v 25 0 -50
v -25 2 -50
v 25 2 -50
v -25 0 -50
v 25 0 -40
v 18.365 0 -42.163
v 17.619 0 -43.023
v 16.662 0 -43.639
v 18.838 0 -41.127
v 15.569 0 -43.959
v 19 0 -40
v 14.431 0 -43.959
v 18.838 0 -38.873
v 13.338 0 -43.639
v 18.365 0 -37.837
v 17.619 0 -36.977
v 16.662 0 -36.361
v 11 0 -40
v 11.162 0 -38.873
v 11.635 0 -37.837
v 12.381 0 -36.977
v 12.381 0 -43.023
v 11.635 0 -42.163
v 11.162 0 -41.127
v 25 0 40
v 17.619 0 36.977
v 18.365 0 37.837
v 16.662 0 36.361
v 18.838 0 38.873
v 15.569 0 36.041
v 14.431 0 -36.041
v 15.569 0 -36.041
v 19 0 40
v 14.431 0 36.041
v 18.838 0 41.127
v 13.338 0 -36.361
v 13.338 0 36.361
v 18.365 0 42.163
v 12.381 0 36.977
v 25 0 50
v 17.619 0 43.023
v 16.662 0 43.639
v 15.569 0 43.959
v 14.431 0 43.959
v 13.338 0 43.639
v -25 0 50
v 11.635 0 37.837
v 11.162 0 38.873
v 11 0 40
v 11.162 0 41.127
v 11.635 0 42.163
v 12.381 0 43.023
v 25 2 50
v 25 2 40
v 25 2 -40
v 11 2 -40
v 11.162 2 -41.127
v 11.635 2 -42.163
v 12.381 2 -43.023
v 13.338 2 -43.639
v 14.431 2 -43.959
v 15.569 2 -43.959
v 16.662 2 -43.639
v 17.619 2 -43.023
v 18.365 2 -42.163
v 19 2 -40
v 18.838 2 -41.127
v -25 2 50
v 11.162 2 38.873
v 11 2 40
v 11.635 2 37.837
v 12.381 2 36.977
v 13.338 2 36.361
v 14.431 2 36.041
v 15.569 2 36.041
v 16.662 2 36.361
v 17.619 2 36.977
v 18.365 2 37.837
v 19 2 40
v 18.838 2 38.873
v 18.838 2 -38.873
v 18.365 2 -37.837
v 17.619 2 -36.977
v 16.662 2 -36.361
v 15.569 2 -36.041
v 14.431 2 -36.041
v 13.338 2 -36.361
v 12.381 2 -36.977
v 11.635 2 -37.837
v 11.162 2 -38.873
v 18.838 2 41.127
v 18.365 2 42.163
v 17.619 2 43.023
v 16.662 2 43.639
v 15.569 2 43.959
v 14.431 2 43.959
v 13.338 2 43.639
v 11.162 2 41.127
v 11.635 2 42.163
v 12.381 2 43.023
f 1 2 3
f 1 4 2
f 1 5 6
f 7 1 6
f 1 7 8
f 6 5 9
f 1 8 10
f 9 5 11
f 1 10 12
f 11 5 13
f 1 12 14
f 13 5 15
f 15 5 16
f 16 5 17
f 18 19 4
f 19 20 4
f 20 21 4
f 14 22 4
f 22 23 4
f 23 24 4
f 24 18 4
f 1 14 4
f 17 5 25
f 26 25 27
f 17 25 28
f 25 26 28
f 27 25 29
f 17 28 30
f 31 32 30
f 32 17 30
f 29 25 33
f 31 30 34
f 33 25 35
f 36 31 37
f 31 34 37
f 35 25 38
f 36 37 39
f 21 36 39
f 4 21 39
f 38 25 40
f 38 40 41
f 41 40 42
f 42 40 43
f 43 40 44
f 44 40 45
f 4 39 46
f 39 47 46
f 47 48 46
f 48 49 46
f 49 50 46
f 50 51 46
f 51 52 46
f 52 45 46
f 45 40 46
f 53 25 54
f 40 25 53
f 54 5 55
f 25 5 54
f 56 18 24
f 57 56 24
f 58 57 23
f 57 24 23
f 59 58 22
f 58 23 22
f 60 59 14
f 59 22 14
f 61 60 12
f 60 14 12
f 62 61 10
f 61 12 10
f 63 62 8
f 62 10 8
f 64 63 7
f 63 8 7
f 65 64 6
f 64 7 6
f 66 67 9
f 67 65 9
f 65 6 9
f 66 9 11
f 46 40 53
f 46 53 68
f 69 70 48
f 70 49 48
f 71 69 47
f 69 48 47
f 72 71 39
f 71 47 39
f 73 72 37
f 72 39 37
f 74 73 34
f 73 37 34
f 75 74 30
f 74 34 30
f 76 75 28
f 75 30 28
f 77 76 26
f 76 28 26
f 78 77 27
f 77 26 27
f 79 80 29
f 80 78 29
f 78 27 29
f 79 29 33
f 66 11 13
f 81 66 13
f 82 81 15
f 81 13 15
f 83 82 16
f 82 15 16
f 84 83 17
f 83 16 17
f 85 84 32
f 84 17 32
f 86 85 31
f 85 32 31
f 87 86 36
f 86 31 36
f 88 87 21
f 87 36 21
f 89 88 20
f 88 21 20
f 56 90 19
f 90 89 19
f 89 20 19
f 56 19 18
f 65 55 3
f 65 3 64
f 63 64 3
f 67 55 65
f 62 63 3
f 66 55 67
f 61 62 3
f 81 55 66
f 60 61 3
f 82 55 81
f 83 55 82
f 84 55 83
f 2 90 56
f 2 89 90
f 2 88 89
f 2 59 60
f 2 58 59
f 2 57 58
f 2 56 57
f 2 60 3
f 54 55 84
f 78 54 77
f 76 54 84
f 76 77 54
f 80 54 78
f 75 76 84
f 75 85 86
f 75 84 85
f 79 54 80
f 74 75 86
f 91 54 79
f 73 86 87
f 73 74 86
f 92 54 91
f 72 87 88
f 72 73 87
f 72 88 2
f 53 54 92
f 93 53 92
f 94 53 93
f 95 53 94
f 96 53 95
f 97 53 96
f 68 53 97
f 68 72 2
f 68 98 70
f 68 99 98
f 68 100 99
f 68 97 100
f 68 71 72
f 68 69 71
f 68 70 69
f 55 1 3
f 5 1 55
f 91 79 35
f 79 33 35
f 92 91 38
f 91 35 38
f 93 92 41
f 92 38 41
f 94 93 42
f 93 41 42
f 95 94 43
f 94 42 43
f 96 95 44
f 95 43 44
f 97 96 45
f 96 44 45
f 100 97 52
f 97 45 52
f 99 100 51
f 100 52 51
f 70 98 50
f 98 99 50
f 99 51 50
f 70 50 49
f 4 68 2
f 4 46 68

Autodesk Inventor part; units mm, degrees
ref_plane "YZ Plane" through (0, 0, 0) normal (1, 0, 0) x (0, 1, 0)
ref_plane "XZ Plane" through (0, 0, 0) normal (0, 1, 0) x (-1, 0, 0)
ref_plane "XY Plane" through (0, 0, 0) normal (0, 0, 1) x (1, 0, 0)
sketch "Sketch1" plane through (0, 0, 0) normal (0, 1, 0) x (-1, 0, 0)
  line L0 (-25, 50) -> (25, 50)
  line L1 (25, 50) -> (25, -50)
  line L2 (25, -50) -> (-25, -50)
  line L3 (-25, -50) -> (-25, 50)
  line L4 (-25, 50) -> (25, -50) construction
  line L5 (25, 50) -> (-25, -50) construction
  line L6 (-25, 50) -> (-25, 40)
  line L7 (-25, 40) -> (-15, 40)
  circle A0 centre (-15, 40) radius 4
  line L8 (-25, -50) -> (-25, -40)
  line L9 (-25, -40) -> (-15, -40)
  circle A1 centre (-15, -40) radius 4
  point P0 (0, 0)
  dimension "d0" = 50
  dimension "d1" = 100
  dimension "d8" = 10
  dimension "d9" = 10
  dimension "d10" = 8
  dimension "d11" = 10
  dimension "d12" = 10
  dimension "d13" = 8
extrude "Extrusion2" add sketch "Sketch1" along normal blind 2
properties part number "H"
